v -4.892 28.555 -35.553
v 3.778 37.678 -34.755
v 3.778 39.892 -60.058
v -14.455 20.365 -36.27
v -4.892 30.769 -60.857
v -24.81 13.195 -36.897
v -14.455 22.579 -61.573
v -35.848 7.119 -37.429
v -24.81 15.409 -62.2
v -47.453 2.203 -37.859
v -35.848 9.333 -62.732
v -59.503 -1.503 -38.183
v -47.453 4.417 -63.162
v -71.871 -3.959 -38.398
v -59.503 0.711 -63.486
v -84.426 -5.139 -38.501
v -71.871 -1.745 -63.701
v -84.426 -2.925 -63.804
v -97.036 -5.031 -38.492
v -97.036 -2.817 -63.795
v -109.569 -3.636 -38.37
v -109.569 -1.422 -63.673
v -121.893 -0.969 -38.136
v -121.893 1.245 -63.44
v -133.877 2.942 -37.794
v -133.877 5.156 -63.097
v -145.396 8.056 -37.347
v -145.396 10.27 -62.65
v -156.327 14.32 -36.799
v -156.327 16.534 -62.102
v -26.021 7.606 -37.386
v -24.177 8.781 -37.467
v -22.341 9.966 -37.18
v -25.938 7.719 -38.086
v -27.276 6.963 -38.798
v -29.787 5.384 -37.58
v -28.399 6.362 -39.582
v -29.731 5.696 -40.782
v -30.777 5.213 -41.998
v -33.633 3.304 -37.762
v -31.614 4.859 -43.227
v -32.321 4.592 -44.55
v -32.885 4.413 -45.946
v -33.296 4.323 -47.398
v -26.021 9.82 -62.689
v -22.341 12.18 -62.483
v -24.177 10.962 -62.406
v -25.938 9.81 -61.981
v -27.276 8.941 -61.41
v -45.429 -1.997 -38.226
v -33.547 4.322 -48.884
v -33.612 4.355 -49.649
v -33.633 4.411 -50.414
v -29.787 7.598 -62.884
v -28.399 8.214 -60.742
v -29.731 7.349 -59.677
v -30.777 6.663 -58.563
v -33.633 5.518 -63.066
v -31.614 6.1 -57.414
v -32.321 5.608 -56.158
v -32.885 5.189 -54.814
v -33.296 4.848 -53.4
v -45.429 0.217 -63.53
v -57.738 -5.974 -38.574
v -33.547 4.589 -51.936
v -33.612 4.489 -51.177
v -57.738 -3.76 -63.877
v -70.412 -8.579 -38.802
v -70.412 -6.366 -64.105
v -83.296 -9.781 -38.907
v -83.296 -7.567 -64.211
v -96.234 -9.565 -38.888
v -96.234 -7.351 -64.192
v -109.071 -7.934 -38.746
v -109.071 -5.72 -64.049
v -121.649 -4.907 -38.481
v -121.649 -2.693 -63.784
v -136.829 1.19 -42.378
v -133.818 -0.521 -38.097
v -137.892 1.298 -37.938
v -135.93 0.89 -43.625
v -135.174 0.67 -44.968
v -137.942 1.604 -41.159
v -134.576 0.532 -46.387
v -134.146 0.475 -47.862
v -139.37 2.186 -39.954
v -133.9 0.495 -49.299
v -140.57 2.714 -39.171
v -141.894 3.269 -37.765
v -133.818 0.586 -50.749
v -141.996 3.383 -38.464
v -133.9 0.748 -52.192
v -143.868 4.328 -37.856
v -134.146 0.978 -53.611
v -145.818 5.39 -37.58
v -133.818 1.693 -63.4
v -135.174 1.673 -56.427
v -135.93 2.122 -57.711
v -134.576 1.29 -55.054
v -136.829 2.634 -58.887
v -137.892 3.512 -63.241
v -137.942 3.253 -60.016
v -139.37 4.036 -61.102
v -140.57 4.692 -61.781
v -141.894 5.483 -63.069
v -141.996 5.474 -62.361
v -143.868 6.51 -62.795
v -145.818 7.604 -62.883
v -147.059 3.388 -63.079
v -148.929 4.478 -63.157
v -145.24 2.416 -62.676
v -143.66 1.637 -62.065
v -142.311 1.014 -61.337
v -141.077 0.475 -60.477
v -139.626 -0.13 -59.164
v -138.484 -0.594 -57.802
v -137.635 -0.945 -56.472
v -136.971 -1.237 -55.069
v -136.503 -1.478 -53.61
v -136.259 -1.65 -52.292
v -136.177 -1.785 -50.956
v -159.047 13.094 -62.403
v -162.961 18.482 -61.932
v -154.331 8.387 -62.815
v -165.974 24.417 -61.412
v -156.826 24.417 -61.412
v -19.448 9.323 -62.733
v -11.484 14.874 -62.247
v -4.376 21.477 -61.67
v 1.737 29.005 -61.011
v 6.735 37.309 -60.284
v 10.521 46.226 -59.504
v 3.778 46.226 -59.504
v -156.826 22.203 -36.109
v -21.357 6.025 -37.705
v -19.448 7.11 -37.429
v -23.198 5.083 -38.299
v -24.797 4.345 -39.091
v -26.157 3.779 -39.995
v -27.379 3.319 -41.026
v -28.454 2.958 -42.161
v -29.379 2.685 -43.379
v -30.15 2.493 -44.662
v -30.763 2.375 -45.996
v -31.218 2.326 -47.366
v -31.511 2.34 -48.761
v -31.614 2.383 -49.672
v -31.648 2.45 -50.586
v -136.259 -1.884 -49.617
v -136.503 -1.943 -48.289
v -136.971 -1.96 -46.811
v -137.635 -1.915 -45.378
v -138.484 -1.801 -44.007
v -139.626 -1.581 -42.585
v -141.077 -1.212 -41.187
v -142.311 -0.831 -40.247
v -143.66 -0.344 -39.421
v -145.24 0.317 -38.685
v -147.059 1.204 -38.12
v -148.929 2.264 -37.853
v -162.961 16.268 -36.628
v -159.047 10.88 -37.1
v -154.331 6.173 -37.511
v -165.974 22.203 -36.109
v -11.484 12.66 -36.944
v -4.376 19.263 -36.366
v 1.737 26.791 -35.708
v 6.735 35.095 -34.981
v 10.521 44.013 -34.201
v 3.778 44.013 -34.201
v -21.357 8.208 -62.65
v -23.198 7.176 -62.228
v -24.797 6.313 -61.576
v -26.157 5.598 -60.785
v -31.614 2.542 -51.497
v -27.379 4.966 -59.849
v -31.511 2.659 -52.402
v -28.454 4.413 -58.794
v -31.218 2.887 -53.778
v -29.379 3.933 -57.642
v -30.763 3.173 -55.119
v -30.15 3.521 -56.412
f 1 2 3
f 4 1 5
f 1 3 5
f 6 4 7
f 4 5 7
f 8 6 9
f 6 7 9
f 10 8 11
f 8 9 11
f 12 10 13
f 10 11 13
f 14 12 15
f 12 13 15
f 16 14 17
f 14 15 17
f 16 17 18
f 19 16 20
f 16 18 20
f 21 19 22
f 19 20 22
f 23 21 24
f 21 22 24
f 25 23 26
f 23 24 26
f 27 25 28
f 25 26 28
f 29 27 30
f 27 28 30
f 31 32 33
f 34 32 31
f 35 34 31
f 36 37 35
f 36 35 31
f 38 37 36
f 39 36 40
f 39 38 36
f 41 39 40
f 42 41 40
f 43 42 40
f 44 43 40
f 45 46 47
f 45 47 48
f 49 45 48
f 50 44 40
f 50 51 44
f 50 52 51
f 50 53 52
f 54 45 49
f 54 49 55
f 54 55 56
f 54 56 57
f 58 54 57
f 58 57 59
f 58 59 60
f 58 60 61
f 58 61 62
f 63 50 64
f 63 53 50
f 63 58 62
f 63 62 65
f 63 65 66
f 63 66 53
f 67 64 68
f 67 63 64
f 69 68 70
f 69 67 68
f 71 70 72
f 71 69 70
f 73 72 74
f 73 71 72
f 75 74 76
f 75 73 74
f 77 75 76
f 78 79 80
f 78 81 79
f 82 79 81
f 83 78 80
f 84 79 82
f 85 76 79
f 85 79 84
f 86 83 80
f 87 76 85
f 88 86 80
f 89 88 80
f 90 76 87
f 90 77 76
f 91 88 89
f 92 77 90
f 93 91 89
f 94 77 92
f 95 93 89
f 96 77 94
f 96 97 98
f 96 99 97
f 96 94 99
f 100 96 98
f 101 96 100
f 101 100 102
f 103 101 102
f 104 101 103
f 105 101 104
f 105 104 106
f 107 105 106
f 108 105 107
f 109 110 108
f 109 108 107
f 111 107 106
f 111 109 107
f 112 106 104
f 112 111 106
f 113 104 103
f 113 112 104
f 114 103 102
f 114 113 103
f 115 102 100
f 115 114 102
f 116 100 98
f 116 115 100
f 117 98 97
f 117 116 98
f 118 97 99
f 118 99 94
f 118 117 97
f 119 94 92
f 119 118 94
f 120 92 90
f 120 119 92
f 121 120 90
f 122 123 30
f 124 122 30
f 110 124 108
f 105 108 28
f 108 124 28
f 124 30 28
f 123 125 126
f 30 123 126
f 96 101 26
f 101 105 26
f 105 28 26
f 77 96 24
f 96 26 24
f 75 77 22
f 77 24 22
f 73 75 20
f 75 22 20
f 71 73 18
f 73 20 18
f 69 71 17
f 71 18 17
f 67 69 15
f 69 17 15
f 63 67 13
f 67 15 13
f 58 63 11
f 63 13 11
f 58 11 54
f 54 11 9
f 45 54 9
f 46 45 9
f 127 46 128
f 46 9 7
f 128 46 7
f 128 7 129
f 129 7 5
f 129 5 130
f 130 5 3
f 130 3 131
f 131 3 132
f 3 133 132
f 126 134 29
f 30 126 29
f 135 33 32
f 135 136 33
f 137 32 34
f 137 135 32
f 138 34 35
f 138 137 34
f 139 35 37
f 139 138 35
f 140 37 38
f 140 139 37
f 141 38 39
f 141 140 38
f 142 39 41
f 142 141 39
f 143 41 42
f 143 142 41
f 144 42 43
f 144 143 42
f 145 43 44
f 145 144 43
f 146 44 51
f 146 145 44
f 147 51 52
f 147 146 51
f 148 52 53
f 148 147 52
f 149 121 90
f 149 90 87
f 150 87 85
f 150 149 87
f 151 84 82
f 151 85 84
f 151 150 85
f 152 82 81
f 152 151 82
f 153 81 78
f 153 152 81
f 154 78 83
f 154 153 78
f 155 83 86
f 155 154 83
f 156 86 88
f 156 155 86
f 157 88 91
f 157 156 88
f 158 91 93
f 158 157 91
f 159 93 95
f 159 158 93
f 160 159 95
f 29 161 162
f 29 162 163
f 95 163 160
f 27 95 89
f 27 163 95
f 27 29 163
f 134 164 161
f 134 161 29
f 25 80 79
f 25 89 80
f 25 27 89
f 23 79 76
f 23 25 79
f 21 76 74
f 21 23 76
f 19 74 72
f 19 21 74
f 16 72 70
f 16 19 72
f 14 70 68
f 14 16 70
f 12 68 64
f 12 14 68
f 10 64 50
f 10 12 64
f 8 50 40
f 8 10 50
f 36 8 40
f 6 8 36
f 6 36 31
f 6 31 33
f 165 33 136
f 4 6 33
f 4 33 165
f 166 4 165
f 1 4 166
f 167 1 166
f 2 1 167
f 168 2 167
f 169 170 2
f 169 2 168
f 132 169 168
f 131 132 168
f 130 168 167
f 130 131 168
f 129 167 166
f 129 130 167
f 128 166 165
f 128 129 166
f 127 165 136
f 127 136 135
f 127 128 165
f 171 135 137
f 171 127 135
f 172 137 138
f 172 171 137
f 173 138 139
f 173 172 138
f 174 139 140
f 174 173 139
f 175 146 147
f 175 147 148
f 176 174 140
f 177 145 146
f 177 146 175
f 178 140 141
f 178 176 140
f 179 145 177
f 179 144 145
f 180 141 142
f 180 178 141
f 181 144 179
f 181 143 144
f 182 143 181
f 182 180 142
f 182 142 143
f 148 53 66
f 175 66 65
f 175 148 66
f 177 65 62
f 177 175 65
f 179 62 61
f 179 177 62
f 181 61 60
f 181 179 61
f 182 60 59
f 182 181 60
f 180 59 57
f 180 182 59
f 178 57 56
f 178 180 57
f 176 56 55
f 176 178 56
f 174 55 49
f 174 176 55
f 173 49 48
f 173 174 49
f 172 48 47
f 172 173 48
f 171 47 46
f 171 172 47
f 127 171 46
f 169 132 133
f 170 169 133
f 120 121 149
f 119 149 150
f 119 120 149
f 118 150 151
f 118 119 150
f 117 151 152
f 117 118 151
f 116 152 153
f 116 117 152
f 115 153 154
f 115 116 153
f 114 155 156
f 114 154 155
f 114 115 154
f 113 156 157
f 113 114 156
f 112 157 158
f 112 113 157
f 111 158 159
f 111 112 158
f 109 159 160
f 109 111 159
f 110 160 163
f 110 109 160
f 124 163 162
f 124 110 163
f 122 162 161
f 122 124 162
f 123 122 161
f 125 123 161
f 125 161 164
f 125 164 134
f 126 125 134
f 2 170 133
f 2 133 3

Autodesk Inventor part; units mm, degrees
ref_plane "YZ Plane" through (0, 0, 0) normal (1, 0, 0) x (0, 1, 0)
ref_plane "XZ Plane" through (0, 0, 0) normal (0, 1, 0) x (-1, 0, 0)
ref_plane "Work Plane1" through (0, 0, -50.8) normal (0, 0, 1) x (1, 0, 0)
sketch "Sketch1" plane through (0, 0, -50.8) normal (0, 0, 1) x (1, 0, 0)
  line L0 (-11.933319, 0) -> (16.362179, 0)
  point P0 (0, 0)
ref_plane "Work Plane2" through (-11.933319, 0, -50.8) normal (0, -0.0871557, 0.9961947) x (1, 0, 0)
sketch "Sketch2" plane through (-11.933319, 0, -50.8) normal (0, -0.0871557, 0.9961947) x (1, 0, 0)
  line L0 (20.901803, 66.92299) -> (20.901803, 43.564038)
  line L1 (18.251803, 42.008516) -> (18.251803, 68.335864)
  line L2 (18.251803, 42.008516) -> (20.901803, 42.008516)
  line L3 (-146.748197, 17.044024) -> (-146.748197, 40.704766)
  line L4 (-149.398197, 17.044024) -> (-149.398197, 40.704766)
  line L5 (-149.398197, 42.001169) -> (-149.398197, 42.510921)
  line L6 (-146.748197, 17.044024) -> (-149.398197, 17.044024)
  arc A0 (-146.748197, 17.044024) -> (18.251803, 42.008516) centre (-77.743959, 118.72499) ccw
  arc A1 (-149.398197, 17.044024) -> (20.901803, 42.008516) centre (-75.863874, 108.764811) ccw
  line L7 (-121.884258, 0.588457) -> (-124.244108, -1.791919)
  arc A2 (-154.040418, 23.398782) -> (-124.244108, -1.791919) centre (-114.93586, 39.435485) ccw
  line L8 (-154.040418, 23.398782) -> (-144.892983, 23.398782)
  line L9 (-144.892983, 23.398782) -> (-144.394088, 15.485637)
  line L10 (-21.699981, 4.427512) -> (-19.714804, 2.459452)
  arc A3 (-19.714804, 2.459452) -> (22.454201, 45.29191) centre (-43.243229, 67.797577) ccw
  line L11 (22.454201, 45.29191) -> (15.711222, 45.29191)
  line L12 (15.711222, 45.29191) -> (15.711222, 38.933181)
  point P0 (11.933319, 4.427512)
extrude "Extrusion1" add sketch "Sketch2" along normal mid plane 25.4
fillet "Fillet1" radius 12.7 4 edges at (-32.6407, 2.3235, -37.8482) (-32.6407, 4.5373, -63.1516) (-134.9975, -1.7063, -38.2008) (-134.9975, 0.5074, -63.5041)
properties part number "thigh_strap_02"
